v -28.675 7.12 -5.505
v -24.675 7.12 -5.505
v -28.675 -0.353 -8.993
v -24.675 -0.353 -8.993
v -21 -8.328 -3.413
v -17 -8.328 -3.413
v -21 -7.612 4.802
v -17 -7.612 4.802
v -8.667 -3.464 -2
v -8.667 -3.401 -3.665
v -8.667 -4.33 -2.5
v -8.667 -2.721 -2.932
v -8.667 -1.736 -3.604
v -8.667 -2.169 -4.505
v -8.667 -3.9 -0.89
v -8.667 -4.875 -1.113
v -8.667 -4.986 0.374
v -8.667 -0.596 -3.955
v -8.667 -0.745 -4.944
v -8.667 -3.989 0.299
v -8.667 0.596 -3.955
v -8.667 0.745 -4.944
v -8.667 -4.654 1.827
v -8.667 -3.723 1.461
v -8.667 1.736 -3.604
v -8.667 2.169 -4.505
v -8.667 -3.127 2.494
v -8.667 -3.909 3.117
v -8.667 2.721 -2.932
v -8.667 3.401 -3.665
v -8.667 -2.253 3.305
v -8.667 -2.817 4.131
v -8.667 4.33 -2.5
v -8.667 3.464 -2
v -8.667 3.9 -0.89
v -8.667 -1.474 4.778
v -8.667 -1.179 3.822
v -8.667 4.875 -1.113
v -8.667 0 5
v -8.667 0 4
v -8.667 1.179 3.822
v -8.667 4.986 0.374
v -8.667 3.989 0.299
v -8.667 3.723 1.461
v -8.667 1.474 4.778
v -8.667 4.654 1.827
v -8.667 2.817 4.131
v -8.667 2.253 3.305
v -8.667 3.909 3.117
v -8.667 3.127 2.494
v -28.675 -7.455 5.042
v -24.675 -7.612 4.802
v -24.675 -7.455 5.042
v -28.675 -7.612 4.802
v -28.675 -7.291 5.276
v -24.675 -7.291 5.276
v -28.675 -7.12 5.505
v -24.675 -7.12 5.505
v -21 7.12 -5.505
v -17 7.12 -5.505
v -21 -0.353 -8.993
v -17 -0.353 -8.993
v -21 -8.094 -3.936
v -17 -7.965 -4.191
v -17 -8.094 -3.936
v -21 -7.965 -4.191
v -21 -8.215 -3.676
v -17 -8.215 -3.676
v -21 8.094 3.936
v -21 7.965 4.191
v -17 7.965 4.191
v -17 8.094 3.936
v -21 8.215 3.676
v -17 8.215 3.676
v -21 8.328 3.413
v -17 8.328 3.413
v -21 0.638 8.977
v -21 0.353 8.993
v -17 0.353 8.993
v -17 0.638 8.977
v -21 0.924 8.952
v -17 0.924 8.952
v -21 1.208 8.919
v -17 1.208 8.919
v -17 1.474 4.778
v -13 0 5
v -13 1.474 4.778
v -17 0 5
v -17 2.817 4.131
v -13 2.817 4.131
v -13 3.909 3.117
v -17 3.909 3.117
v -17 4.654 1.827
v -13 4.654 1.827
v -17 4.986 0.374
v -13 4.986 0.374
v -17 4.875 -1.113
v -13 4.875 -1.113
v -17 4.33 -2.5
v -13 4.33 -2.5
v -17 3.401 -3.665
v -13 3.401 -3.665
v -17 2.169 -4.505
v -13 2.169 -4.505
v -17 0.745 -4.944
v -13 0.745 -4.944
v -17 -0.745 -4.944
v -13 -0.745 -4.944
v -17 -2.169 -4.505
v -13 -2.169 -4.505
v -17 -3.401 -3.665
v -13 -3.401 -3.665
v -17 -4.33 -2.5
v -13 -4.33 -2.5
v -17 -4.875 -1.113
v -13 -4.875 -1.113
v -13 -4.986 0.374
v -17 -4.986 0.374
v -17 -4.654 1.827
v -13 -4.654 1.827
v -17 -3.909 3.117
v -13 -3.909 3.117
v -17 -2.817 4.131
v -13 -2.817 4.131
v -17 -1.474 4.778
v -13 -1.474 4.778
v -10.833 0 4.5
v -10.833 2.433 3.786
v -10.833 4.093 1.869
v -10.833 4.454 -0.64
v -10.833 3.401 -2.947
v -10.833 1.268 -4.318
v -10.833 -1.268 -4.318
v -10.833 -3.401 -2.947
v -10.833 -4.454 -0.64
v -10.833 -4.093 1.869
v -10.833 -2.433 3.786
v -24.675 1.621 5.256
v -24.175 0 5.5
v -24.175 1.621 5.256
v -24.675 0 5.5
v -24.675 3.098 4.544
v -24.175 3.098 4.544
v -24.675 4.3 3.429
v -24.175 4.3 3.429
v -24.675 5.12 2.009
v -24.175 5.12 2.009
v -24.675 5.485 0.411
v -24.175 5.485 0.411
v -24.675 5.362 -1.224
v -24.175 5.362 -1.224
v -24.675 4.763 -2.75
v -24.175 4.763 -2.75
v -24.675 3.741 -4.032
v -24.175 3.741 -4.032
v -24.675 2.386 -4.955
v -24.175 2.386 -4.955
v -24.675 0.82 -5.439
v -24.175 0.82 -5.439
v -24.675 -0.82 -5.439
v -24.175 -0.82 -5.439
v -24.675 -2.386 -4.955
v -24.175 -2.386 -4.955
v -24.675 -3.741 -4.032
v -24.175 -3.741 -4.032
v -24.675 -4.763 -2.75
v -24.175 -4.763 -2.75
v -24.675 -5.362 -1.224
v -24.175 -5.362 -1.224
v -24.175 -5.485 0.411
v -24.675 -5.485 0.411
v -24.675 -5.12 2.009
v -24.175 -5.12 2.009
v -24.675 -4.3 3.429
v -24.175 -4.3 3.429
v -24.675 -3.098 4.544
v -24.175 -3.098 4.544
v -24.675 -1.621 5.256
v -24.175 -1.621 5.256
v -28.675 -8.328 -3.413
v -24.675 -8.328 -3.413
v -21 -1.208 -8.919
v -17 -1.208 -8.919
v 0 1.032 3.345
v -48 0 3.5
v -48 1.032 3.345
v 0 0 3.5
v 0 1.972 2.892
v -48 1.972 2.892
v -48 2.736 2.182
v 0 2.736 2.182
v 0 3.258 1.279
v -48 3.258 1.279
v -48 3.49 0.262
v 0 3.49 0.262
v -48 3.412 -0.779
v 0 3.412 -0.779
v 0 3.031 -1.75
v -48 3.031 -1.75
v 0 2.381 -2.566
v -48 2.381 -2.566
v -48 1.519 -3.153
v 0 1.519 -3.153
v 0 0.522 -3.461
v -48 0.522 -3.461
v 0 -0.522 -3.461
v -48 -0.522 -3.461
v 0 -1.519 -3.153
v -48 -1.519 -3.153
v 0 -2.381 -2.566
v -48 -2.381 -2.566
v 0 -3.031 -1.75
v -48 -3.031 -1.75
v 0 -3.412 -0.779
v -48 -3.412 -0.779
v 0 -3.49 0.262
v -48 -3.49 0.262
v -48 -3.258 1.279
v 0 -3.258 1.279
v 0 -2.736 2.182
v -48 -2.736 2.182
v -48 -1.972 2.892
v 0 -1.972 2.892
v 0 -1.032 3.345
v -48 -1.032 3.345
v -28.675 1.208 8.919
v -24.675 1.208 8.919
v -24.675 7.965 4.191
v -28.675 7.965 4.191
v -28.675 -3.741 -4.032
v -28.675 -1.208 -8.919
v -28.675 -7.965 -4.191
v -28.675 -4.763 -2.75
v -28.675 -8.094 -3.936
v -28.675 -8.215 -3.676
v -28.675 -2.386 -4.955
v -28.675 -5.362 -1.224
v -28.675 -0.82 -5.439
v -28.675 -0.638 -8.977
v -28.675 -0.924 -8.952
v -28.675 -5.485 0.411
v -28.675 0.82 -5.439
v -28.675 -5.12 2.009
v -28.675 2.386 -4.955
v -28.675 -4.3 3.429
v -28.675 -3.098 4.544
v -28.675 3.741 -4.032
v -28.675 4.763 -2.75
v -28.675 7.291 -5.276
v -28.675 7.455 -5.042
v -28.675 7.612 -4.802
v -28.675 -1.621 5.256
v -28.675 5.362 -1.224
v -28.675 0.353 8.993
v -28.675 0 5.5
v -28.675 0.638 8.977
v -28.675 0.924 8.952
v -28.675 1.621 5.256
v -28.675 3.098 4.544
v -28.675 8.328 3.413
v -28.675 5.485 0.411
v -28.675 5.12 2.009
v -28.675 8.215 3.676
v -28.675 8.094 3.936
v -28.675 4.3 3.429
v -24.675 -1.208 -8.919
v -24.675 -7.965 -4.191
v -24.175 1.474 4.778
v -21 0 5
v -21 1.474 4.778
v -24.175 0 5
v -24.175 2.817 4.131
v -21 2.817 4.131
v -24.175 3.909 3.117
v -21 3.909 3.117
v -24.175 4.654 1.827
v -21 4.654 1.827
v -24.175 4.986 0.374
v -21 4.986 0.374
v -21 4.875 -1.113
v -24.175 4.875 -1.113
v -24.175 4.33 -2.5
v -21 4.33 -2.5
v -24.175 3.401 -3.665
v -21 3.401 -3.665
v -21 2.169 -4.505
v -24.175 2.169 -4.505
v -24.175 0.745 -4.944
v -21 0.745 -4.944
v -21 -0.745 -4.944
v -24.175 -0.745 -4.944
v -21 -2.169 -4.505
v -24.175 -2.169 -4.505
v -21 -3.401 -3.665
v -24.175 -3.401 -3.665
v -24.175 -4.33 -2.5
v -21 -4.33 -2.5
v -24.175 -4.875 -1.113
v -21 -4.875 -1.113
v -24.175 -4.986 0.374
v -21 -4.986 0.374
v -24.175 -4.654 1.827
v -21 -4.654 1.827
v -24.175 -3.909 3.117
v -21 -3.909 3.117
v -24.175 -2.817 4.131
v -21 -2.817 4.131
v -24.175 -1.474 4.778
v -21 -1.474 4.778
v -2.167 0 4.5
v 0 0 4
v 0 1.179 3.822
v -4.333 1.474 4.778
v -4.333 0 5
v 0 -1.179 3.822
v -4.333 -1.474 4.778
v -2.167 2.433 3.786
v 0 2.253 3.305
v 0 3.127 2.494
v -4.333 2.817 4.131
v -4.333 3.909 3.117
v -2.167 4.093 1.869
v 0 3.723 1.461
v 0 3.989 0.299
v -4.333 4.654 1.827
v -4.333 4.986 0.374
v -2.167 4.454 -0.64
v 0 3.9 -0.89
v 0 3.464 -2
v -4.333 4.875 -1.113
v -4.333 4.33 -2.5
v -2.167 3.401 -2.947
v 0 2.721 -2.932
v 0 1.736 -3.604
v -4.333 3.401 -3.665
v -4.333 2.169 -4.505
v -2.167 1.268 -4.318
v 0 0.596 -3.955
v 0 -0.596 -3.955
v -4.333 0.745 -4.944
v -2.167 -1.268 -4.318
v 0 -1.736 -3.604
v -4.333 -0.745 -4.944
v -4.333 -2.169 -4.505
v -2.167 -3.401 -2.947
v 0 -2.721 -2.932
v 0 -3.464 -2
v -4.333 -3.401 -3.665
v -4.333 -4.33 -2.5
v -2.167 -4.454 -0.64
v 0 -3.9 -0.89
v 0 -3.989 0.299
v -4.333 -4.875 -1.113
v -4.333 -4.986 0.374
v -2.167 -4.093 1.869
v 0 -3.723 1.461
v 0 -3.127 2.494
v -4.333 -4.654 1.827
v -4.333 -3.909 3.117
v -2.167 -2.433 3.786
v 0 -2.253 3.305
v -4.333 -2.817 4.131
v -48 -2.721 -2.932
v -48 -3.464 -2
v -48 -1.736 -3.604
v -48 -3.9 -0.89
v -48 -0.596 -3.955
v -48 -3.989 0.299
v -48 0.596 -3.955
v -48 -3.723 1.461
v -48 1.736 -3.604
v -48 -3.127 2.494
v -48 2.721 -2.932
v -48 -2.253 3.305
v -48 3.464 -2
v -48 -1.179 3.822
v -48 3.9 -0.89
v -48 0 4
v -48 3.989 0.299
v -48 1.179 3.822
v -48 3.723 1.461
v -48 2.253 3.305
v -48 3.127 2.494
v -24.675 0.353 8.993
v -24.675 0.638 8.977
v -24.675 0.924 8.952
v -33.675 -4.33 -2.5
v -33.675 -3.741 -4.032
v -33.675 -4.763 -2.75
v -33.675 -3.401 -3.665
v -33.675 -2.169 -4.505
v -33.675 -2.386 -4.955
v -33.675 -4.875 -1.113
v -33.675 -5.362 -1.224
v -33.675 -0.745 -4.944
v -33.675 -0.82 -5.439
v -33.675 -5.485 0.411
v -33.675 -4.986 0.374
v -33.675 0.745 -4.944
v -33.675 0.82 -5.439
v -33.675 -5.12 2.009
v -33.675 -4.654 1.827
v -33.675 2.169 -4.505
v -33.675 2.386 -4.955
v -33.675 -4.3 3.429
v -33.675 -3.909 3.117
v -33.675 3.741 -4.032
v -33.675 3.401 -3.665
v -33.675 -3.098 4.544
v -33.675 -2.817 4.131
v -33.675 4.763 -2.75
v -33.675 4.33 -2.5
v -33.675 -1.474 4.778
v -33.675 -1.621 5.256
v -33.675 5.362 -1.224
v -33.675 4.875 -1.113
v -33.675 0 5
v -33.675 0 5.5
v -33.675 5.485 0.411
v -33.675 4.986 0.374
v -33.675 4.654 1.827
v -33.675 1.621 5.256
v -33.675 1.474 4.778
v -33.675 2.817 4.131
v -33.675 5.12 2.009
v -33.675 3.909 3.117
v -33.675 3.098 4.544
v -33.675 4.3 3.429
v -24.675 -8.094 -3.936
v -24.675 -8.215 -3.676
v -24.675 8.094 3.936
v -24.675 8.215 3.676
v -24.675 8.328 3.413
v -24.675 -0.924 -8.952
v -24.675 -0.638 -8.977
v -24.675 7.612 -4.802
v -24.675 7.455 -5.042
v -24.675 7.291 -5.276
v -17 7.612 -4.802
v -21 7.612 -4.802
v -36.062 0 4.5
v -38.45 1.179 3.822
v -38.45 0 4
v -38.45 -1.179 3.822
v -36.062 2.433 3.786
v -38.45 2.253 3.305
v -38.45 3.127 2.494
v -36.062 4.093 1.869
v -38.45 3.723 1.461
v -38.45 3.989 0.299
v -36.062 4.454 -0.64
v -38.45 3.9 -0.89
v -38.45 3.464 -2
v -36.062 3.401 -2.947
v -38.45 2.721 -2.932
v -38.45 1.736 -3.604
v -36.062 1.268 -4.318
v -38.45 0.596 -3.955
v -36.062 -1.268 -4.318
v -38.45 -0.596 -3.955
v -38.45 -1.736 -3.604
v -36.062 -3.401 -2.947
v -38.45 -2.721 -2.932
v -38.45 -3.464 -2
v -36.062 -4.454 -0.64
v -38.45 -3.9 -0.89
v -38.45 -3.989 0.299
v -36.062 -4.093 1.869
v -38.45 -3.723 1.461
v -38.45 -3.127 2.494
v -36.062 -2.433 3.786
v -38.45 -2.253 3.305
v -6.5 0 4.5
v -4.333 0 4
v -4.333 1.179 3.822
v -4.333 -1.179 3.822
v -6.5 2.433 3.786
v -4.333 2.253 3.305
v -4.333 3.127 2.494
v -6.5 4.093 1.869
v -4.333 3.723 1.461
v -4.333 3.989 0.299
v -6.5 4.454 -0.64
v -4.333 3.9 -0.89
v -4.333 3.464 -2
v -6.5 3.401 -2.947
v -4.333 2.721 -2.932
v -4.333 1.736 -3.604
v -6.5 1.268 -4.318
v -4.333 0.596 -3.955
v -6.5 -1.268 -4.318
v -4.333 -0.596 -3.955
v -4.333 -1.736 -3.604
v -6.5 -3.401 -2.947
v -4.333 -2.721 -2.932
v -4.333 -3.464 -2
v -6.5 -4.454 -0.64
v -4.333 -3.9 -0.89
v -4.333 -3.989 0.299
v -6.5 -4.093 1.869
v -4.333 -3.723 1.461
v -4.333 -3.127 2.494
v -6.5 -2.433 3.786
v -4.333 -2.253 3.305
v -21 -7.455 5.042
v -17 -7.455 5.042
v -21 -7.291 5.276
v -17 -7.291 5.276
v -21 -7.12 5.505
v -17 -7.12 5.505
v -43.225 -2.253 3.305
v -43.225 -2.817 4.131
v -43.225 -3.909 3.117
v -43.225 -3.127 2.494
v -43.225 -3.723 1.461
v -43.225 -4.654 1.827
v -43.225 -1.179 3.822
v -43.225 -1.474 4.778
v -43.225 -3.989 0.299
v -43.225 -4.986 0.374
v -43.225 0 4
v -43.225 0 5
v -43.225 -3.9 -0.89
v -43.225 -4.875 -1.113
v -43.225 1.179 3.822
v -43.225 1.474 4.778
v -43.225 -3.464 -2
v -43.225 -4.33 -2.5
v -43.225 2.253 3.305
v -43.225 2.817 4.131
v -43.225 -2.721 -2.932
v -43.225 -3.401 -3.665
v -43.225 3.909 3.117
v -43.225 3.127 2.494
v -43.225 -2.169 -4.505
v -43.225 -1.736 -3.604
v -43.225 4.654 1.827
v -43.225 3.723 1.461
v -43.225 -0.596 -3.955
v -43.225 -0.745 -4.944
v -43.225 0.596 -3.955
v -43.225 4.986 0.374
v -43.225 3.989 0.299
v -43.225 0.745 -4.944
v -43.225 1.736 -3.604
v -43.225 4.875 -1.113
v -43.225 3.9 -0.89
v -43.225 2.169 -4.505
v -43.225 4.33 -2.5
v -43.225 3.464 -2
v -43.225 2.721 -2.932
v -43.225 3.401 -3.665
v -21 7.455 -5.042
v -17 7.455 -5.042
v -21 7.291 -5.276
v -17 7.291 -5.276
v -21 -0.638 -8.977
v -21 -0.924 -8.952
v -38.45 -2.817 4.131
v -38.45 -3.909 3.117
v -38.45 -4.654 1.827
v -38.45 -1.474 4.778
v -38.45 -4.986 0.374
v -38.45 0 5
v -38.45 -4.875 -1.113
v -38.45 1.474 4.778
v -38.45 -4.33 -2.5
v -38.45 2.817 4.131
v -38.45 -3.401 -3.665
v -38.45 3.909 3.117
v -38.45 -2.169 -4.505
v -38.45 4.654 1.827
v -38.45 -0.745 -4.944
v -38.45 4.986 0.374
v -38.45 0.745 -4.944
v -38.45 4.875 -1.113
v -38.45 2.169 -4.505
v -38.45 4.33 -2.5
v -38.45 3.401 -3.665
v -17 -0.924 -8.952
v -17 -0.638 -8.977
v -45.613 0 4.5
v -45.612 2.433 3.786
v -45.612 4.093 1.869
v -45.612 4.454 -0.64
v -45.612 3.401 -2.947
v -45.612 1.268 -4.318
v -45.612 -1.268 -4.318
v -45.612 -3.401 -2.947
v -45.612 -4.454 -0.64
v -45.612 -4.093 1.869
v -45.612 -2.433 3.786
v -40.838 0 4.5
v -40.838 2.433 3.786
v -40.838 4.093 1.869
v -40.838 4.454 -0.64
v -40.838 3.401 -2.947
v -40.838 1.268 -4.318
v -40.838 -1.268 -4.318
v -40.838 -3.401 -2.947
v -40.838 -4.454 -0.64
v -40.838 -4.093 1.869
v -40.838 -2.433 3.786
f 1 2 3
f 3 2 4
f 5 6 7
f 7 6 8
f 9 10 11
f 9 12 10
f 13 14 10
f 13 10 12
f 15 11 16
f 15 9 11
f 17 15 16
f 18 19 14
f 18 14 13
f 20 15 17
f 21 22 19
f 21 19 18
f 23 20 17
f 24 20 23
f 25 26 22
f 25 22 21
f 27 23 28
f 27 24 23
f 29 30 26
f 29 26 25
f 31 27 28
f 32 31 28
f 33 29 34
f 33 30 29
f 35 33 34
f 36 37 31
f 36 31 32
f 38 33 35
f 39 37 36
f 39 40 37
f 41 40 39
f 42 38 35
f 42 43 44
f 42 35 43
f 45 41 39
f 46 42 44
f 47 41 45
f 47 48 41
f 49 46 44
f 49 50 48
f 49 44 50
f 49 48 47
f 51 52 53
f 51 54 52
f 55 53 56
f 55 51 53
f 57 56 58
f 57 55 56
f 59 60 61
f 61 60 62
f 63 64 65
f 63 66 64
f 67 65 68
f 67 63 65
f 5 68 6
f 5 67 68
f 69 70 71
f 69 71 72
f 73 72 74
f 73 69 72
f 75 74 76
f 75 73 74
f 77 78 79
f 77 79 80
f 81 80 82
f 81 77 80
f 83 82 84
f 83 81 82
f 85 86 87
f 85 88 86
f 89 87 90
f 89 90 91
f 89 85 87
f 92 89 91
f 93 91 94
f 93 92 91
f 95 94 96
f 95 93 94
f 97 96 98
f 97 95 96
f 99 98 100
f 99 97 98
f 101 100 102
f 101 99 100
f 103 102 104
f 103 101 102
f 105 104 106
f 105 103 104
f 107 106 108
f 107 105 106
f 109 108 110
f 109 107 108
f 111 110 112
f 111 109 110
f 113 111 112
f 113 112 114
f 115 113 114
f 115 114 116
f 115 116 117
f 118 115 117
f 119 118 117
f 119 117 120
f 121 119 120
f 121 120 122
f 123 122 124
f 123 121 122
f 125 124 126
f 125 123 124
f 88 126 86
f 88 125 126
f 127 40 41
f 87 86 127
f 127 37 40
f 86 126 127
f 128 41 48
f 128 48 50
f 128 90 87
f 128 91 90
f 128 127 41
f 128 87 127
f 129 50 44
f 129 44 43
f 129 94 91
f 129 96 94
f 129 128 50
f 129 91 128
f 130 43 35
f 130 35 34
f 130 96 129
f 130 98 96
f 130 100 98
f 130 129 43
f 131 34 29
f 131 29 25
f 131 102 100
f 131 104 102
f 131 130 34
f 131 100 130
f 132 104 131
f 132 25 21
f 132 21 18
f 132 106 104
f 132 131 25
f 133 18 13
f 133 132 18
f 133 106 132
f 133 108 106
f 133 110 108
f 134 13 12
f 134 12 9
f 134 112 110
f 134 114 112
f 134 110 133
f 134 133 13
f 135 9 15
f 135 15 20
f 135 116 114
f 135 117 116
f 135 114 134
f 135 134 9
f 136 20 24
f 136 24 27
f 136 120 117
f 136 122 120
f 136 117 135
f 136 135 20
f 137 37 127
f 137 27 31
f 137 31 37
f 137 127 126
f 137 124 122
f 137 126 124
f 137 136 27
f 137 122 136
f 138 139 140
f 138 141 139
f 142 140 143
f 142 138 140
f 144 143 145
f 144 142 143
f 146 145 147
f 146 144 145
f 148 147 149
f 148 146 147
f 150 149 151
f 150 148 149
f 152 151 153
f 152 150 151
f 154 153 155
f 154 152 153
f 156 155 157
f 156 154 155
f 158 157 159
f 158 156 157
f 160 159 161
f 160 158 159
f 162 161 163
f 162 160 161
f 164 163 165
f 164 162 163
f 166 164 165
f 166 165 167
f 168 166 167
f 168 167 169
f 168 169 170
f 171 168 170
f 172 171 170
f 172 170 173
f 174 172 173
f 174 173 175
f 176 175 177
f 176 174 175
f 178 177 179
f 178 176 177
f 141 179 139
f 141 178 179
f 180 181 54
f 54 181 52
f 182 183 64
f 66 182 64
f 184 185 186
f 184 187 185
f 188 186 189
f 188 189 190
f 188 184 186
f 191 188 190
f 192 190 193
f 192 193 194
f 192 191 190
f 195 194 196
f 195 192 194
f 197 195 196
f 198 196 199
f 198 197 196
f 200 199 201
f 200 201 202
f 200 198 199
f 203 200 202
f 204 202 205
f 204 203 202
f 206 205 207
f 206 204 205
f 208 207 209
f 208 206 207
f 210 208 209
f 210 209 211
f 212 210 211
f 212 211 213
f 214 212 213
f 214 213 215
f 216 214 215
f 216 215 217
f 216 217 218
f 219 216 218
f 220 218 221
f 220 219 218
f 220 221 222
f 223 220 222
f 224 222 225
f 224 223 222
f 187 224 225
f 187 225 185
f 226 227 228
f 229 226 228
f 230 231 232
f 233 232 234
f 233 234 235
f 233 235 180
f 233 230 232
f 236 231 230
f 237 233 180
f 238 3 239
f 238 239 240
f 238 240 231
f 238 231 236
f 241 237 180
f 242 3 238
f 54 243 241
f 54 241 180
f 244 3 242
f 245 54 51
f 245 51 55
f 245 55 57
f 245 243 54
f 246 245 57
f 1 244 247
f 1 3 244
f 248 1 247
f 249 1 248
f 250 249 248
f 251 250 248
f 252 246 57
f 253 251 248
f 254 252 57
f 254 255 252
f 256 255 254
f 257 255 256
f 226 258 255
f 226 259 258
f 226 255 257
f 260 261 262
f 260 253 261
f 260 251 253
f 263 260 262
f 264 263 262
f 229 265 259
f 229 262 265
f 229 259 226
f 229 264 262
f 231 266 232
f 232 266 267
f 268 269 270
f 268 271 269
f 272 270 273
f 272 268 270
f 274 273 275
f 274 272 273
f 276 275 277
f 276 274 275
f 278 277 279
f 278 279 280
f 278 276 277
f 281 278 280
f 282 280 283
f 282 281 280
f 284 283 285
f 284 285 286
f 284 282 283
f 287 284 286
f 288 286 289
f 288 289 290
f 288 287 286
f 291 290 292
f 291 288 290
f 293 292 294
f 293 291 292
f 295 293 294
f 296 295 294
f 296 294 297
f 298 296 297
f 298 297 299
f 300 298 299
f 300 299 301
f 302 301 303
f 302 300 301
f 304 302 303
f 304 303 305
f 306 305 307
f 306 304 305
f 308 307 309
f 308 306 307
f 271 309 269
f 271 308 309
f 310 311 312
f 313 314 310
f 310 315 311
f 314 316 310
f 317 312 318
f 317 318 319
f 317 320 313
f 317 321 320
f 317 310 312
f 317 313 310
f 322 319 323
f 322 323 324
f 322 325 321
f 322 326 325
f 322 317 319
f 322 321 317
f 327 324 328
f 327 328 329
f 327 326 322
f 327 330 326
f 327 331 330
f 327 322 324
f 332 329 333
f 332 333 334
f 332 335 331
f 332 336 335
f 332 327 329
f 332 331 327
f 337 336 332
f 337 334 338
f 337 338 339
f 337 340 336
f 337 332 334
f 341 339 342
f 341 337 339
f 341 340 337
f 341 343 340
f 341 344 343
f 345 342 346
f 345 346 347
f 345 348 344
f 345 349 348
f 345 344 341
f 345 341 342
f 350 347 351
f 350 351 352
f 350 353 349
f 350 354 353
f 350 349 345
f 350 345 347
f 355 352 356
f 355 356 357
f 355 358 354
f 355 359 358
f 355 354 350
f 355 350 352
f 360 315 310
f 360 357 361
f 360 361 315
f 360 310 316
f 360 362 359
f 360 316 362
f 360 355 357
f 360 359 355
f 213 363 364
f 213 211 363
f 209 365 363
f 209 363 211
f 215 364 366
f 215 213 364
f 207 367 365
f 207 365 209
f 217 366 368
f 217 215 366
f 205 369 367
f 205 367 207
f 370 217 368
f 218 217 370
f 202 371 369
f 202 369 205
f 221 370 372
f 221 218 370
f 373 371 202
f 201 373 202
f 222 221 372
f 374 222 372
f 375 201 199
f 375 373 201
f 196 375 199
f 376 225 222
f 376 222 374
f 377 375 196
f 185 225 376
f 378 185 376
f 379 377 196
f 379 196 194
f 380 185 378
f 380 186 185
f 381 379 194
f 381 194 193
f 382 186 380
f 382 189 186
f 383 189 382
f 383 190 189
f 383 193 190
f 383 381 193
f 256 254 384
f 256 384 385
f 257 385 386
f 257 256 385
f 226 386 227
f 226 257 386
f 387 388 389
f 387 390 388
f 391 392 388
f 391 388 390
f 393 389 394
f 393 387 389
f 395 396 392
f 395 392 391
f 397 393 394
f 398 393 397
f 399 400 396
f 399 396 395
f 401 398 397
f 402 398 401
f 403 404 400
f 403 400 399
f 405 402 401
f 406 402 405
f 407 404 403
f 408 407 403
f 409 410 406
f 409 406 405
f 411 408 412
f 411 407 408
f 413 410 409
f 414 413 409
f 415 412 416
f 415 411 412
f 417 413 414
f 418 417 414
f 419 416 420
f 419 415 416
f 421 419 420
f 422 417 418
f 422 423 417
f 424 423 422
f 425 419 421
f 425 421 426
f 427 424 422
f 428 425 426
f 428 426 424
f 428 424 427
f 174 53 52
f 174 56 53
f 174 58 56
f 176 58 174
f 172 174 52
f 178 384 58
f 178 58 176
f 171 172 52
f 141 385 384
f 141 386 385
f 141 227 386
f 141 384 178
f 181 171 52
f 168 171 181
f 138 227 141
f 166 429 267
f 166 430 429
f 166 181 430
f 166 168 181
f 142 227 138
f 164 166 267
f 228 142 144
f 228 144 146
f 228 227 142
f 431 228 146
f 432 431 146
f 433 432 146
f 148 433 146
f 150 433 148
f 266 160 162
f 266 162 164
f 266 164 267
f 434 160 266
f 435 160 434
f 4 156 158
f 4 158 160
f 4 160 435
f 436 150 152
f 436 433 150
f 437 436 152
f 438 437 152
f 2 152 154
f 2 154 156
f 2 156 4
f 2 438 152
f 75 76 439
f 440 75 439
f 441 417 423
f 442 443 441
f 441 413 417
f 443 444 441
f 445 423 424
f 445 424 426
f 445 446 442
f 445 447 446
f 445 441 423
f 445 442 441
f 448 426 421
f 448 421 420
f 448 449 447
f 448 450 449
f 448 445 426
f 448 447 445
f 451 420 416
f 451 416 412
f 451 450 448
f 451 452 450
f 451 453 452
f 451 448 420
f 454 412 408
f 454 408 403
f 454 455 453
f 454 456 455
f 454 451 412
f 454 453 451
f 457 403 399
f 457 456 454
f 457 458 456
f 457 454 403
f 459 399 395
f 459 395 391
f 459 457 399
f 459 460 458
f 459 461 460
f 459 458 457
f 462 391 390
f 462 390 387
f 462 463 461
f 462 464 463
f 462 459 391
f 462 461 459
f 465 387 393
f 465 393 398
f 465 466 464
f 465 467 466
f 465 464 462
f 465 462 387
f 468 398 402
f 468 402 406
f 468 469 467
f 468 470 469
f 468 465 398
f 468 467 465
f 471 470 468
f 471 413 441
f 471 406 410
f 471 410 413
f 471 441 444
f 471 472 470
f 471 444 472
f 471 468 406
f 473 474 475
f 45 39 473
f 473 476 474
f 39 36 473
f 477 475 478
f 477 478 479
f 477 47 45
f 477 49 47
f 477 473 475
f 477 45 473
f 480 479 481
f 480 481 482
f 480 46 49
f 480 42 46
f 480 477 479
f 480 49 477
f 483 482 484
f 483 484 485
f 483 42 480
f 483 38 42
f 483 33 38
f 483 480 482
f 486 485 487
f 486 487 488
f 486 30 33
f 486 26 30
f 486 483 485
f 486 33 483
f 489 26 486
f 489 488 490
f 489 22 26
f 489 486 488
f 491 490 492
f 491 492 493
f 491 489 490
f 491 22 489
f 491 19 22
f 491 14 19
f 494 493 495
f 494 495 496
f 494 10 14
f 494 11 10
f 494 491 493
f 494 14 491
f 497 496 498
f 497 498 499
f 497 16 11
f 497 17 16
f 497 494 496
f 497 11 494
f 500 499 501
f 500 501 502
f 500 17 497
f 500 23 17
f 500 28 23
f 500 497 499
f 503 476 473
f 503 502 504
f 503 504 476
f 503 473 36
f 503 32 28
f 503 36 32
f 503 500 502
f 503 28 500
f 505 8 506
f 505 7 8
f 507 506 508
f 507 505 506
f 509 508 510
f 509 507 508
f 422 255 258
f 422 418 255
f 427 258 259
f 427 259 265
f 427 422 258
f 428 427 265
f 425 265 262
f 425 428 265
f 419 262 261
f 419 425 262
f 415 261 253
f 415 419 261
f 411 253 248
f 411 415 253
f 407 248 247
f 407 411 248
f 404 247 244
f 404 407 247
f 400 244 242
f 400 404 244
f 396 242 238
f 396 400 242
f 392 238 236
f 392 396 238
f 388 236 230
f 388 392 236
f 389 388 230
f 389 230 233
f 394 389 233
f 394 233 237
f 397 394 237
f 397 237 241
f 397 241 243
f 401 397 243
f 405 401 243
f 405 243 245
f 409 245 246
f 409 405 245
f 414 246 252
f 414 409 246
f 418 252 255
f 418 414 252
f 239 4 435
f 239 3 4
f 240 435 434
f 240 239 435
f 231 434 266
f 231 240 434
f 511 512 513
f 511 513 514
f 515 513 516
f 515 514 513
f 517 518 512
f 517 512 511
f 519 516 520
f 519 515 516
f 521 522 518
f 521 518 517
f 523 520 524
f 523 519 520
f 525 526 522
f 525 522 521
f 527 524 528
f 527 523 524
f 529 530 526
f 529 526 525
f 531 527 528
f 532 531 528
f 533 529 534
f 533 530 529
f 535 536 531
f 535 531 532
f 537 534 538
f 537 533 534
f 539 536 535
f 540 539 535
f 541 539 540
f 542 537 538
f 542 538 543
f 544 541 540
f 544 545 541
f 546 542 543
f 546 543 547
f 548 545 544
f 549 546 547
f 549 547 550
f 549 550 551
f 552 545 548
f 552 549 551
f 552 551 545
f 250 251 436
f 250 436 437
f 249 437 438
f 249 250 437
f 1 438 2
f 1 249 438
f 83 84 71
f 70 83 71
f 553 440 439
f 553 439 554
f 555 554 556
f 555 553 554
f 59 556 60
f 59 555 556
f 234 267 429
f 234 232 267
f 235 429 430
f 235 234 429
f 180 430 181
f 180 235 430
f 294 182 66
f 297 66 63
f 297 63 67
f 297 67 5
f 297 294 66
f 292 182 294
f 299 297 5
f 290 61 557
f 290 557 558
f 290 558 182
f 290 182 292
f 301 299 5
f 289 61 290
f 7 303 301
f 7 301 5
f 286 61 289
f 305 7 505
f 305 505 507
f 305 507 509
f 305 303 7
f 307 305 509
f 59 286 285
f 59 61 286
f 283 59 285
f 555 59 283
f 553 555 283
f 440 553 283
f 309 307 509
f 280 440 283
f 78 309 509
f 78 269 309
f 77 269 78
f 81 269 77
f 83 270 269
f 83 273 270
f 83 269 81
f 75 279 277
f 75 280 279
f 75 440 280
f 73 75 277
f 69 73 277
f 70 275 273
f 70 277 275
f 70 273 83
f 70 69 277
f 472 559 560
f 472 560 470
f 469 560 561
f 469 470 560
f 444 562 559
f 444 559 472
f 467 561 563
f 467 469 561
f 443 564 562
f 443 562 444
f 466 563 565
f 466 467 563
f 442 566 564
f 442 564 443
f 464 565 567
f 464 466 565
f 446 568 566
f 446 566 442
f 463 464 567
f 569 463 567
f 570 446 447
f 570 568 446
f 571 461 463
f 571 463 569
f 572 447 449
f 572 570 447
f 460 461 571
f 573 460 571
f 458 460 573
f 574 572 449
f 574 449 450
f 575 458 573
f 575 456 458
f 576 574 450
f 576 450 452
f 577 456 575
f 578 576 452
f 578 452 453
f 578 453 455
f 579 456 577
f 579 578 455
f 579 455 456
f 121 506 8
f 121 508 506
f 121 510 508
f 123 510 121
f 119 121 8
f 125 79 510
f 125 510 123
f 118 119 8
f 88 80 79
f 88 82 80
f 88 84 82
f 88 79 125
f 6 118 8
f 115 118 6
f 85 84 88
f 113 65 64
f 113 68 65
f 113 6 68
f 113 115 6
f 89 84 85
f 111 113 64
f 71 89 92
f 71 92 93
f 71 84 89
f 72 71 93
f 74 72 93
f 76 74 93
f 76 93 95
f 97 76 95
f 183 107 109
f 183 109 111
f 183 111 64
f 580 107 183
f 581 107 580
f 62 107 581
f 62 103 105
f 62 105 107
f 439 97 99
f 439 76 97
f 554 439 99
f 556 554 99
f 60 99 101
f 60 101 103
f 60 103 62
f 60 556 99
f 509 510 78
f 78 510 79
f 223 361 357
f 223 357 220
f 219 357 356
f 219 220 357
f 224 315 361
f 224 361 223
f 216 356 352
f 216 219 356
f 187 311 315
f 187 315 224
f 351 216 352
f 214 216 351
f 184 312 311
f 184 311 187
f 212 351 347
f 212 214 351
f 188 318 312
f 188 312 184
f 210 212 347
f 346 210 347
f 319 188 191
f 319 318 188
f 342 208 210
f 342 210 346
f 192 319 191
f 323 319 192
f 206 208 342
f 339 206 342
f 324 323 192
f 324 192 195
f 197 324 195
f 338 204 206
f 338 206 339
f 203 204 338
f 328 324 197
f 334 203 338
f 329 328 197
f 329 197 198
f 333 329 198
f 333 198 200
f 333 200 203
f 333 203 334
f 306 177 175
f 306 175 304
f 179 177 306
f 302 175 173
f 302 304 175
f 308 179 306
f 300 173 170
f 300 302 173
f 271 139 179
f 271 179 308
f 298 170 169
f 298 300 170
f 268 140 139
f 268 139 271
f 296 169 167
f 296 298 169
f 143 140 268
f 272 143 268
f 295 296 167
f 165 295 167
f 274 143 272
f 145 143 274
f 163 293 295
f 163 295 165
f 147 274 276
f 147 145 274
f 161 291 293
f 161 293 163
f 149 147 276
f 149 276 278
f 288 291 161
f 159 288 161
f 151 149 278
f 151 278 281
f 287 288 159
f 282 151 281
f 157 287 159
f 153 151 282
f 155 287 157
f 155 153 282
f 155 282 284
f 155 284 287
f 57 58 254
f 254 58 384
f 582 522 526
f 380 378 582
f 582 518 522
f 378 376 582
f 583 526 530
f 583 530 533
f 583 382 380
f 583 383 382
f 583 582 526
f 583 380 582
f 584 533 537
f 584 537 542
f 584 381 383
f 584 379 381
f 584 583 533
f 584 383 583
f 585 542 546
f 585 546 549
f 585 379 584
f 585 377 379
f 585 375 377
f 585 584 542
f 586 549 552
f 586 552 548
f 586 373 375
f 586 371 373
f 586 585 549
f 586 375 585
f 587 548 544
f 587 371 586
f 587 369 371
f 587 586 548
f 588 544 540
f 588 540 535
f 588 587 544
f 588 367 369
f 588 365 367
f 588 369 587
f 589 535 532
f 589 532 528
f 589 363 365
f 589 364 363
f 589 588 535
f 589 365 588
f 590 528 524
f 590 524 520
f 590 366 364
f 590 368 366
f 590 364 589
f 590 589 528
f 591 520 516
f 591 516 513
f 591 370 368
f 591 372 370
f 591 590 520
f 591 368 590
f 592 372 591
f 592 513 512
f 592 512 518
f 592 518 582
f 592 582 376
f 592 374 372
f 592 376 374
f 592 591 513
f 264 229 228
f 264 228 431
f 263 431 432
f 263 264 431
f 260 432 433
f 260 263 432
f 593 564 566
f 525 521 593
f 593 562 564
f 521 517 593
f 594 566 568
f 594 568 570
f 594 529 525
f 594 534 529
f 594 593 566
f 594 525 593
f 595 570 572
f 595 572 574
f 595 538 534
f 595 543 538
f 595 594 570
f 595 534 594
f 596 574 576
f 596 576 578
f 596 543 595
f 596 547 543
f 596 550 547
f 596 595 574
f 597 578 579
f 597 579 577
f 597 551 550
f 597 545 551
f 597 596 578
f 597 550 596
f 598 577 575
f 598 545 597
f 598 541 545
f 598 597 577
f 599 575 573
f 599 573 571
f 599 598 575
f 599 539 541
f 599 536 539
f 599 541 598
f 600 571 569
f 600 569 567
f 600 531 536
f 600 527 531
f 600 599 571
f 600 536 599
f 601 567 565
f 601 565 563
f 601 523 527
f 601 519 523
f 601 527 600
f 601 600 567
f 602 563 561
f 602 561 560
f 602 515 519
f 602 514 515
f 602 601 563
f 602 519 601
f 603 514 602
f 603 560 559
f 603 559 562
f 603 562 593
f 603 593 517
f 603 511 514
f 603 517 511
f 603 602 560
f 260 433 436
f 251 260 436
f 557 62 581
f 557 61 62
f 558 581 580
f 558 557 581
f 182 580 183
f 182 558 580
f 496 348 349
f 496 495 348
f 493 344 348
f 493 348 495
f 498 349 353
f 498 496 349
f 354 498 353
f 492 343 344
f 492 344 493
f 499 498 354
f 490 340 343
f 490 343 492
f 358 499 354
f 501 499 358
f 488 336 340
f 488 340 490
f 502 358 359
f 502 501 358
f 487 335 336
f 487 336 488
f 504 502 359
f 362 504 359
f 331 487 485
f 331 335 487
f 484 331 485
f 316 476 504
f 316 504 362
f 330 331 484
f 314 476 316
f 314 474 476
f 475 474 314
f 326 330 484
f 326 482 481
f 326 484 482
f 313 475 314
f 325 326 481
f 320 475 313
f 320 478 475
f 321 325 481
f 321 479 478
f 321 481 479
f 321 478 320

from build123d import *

# Parameters (mm, degrees)
F2_R     = 19.00963
F3_DEPTH = 50.9


with BuildPart() as f1:
    # F0 (on Front) → F1 (revolve)
    with BuildSketch(Plane.XZ):
        Polygon((-48, 4), (-48, 3.5), (0, 3.5), (0, 4), (-4.333333, 5), (-4.333333, 4), (-8.666667, 5), (-8.666667, 4), (-13, 5), (-17, 5), (-17, 9), (-21, 9), (-21, 5), (-24.175, 5), (-24.175, 5.5), (-24.675, 5.5), (-24.675, 9), (-28.675, 9), (-28.675, 5.5), (-33.675, 5.5), (-33.675, 5), (-38.45, 4), (-38.45, 5), (-43.225, 4), (-43.225, 5), align=None)
    revolve(axis=Axis((-24, 0, 0), (-1, 0, 0)))

    # F2 (on Right) → F3 (cut)
    with BuildSketch(Plane.YZ):
        Circle(F2_R)
        Polygon((0.801815, 9.20274), (8.370714, 3.906978), (7.568899, -5.295762), (-0.801815, -9.20274), (-8.370714, -3.906978), (-7.568899, 5.295762), align=None, mode=Mode.SUBTRACT)
    extrude(amount=-F3_DEPTH, mode=Mode.SUBTRACT)


solid = f1.part
